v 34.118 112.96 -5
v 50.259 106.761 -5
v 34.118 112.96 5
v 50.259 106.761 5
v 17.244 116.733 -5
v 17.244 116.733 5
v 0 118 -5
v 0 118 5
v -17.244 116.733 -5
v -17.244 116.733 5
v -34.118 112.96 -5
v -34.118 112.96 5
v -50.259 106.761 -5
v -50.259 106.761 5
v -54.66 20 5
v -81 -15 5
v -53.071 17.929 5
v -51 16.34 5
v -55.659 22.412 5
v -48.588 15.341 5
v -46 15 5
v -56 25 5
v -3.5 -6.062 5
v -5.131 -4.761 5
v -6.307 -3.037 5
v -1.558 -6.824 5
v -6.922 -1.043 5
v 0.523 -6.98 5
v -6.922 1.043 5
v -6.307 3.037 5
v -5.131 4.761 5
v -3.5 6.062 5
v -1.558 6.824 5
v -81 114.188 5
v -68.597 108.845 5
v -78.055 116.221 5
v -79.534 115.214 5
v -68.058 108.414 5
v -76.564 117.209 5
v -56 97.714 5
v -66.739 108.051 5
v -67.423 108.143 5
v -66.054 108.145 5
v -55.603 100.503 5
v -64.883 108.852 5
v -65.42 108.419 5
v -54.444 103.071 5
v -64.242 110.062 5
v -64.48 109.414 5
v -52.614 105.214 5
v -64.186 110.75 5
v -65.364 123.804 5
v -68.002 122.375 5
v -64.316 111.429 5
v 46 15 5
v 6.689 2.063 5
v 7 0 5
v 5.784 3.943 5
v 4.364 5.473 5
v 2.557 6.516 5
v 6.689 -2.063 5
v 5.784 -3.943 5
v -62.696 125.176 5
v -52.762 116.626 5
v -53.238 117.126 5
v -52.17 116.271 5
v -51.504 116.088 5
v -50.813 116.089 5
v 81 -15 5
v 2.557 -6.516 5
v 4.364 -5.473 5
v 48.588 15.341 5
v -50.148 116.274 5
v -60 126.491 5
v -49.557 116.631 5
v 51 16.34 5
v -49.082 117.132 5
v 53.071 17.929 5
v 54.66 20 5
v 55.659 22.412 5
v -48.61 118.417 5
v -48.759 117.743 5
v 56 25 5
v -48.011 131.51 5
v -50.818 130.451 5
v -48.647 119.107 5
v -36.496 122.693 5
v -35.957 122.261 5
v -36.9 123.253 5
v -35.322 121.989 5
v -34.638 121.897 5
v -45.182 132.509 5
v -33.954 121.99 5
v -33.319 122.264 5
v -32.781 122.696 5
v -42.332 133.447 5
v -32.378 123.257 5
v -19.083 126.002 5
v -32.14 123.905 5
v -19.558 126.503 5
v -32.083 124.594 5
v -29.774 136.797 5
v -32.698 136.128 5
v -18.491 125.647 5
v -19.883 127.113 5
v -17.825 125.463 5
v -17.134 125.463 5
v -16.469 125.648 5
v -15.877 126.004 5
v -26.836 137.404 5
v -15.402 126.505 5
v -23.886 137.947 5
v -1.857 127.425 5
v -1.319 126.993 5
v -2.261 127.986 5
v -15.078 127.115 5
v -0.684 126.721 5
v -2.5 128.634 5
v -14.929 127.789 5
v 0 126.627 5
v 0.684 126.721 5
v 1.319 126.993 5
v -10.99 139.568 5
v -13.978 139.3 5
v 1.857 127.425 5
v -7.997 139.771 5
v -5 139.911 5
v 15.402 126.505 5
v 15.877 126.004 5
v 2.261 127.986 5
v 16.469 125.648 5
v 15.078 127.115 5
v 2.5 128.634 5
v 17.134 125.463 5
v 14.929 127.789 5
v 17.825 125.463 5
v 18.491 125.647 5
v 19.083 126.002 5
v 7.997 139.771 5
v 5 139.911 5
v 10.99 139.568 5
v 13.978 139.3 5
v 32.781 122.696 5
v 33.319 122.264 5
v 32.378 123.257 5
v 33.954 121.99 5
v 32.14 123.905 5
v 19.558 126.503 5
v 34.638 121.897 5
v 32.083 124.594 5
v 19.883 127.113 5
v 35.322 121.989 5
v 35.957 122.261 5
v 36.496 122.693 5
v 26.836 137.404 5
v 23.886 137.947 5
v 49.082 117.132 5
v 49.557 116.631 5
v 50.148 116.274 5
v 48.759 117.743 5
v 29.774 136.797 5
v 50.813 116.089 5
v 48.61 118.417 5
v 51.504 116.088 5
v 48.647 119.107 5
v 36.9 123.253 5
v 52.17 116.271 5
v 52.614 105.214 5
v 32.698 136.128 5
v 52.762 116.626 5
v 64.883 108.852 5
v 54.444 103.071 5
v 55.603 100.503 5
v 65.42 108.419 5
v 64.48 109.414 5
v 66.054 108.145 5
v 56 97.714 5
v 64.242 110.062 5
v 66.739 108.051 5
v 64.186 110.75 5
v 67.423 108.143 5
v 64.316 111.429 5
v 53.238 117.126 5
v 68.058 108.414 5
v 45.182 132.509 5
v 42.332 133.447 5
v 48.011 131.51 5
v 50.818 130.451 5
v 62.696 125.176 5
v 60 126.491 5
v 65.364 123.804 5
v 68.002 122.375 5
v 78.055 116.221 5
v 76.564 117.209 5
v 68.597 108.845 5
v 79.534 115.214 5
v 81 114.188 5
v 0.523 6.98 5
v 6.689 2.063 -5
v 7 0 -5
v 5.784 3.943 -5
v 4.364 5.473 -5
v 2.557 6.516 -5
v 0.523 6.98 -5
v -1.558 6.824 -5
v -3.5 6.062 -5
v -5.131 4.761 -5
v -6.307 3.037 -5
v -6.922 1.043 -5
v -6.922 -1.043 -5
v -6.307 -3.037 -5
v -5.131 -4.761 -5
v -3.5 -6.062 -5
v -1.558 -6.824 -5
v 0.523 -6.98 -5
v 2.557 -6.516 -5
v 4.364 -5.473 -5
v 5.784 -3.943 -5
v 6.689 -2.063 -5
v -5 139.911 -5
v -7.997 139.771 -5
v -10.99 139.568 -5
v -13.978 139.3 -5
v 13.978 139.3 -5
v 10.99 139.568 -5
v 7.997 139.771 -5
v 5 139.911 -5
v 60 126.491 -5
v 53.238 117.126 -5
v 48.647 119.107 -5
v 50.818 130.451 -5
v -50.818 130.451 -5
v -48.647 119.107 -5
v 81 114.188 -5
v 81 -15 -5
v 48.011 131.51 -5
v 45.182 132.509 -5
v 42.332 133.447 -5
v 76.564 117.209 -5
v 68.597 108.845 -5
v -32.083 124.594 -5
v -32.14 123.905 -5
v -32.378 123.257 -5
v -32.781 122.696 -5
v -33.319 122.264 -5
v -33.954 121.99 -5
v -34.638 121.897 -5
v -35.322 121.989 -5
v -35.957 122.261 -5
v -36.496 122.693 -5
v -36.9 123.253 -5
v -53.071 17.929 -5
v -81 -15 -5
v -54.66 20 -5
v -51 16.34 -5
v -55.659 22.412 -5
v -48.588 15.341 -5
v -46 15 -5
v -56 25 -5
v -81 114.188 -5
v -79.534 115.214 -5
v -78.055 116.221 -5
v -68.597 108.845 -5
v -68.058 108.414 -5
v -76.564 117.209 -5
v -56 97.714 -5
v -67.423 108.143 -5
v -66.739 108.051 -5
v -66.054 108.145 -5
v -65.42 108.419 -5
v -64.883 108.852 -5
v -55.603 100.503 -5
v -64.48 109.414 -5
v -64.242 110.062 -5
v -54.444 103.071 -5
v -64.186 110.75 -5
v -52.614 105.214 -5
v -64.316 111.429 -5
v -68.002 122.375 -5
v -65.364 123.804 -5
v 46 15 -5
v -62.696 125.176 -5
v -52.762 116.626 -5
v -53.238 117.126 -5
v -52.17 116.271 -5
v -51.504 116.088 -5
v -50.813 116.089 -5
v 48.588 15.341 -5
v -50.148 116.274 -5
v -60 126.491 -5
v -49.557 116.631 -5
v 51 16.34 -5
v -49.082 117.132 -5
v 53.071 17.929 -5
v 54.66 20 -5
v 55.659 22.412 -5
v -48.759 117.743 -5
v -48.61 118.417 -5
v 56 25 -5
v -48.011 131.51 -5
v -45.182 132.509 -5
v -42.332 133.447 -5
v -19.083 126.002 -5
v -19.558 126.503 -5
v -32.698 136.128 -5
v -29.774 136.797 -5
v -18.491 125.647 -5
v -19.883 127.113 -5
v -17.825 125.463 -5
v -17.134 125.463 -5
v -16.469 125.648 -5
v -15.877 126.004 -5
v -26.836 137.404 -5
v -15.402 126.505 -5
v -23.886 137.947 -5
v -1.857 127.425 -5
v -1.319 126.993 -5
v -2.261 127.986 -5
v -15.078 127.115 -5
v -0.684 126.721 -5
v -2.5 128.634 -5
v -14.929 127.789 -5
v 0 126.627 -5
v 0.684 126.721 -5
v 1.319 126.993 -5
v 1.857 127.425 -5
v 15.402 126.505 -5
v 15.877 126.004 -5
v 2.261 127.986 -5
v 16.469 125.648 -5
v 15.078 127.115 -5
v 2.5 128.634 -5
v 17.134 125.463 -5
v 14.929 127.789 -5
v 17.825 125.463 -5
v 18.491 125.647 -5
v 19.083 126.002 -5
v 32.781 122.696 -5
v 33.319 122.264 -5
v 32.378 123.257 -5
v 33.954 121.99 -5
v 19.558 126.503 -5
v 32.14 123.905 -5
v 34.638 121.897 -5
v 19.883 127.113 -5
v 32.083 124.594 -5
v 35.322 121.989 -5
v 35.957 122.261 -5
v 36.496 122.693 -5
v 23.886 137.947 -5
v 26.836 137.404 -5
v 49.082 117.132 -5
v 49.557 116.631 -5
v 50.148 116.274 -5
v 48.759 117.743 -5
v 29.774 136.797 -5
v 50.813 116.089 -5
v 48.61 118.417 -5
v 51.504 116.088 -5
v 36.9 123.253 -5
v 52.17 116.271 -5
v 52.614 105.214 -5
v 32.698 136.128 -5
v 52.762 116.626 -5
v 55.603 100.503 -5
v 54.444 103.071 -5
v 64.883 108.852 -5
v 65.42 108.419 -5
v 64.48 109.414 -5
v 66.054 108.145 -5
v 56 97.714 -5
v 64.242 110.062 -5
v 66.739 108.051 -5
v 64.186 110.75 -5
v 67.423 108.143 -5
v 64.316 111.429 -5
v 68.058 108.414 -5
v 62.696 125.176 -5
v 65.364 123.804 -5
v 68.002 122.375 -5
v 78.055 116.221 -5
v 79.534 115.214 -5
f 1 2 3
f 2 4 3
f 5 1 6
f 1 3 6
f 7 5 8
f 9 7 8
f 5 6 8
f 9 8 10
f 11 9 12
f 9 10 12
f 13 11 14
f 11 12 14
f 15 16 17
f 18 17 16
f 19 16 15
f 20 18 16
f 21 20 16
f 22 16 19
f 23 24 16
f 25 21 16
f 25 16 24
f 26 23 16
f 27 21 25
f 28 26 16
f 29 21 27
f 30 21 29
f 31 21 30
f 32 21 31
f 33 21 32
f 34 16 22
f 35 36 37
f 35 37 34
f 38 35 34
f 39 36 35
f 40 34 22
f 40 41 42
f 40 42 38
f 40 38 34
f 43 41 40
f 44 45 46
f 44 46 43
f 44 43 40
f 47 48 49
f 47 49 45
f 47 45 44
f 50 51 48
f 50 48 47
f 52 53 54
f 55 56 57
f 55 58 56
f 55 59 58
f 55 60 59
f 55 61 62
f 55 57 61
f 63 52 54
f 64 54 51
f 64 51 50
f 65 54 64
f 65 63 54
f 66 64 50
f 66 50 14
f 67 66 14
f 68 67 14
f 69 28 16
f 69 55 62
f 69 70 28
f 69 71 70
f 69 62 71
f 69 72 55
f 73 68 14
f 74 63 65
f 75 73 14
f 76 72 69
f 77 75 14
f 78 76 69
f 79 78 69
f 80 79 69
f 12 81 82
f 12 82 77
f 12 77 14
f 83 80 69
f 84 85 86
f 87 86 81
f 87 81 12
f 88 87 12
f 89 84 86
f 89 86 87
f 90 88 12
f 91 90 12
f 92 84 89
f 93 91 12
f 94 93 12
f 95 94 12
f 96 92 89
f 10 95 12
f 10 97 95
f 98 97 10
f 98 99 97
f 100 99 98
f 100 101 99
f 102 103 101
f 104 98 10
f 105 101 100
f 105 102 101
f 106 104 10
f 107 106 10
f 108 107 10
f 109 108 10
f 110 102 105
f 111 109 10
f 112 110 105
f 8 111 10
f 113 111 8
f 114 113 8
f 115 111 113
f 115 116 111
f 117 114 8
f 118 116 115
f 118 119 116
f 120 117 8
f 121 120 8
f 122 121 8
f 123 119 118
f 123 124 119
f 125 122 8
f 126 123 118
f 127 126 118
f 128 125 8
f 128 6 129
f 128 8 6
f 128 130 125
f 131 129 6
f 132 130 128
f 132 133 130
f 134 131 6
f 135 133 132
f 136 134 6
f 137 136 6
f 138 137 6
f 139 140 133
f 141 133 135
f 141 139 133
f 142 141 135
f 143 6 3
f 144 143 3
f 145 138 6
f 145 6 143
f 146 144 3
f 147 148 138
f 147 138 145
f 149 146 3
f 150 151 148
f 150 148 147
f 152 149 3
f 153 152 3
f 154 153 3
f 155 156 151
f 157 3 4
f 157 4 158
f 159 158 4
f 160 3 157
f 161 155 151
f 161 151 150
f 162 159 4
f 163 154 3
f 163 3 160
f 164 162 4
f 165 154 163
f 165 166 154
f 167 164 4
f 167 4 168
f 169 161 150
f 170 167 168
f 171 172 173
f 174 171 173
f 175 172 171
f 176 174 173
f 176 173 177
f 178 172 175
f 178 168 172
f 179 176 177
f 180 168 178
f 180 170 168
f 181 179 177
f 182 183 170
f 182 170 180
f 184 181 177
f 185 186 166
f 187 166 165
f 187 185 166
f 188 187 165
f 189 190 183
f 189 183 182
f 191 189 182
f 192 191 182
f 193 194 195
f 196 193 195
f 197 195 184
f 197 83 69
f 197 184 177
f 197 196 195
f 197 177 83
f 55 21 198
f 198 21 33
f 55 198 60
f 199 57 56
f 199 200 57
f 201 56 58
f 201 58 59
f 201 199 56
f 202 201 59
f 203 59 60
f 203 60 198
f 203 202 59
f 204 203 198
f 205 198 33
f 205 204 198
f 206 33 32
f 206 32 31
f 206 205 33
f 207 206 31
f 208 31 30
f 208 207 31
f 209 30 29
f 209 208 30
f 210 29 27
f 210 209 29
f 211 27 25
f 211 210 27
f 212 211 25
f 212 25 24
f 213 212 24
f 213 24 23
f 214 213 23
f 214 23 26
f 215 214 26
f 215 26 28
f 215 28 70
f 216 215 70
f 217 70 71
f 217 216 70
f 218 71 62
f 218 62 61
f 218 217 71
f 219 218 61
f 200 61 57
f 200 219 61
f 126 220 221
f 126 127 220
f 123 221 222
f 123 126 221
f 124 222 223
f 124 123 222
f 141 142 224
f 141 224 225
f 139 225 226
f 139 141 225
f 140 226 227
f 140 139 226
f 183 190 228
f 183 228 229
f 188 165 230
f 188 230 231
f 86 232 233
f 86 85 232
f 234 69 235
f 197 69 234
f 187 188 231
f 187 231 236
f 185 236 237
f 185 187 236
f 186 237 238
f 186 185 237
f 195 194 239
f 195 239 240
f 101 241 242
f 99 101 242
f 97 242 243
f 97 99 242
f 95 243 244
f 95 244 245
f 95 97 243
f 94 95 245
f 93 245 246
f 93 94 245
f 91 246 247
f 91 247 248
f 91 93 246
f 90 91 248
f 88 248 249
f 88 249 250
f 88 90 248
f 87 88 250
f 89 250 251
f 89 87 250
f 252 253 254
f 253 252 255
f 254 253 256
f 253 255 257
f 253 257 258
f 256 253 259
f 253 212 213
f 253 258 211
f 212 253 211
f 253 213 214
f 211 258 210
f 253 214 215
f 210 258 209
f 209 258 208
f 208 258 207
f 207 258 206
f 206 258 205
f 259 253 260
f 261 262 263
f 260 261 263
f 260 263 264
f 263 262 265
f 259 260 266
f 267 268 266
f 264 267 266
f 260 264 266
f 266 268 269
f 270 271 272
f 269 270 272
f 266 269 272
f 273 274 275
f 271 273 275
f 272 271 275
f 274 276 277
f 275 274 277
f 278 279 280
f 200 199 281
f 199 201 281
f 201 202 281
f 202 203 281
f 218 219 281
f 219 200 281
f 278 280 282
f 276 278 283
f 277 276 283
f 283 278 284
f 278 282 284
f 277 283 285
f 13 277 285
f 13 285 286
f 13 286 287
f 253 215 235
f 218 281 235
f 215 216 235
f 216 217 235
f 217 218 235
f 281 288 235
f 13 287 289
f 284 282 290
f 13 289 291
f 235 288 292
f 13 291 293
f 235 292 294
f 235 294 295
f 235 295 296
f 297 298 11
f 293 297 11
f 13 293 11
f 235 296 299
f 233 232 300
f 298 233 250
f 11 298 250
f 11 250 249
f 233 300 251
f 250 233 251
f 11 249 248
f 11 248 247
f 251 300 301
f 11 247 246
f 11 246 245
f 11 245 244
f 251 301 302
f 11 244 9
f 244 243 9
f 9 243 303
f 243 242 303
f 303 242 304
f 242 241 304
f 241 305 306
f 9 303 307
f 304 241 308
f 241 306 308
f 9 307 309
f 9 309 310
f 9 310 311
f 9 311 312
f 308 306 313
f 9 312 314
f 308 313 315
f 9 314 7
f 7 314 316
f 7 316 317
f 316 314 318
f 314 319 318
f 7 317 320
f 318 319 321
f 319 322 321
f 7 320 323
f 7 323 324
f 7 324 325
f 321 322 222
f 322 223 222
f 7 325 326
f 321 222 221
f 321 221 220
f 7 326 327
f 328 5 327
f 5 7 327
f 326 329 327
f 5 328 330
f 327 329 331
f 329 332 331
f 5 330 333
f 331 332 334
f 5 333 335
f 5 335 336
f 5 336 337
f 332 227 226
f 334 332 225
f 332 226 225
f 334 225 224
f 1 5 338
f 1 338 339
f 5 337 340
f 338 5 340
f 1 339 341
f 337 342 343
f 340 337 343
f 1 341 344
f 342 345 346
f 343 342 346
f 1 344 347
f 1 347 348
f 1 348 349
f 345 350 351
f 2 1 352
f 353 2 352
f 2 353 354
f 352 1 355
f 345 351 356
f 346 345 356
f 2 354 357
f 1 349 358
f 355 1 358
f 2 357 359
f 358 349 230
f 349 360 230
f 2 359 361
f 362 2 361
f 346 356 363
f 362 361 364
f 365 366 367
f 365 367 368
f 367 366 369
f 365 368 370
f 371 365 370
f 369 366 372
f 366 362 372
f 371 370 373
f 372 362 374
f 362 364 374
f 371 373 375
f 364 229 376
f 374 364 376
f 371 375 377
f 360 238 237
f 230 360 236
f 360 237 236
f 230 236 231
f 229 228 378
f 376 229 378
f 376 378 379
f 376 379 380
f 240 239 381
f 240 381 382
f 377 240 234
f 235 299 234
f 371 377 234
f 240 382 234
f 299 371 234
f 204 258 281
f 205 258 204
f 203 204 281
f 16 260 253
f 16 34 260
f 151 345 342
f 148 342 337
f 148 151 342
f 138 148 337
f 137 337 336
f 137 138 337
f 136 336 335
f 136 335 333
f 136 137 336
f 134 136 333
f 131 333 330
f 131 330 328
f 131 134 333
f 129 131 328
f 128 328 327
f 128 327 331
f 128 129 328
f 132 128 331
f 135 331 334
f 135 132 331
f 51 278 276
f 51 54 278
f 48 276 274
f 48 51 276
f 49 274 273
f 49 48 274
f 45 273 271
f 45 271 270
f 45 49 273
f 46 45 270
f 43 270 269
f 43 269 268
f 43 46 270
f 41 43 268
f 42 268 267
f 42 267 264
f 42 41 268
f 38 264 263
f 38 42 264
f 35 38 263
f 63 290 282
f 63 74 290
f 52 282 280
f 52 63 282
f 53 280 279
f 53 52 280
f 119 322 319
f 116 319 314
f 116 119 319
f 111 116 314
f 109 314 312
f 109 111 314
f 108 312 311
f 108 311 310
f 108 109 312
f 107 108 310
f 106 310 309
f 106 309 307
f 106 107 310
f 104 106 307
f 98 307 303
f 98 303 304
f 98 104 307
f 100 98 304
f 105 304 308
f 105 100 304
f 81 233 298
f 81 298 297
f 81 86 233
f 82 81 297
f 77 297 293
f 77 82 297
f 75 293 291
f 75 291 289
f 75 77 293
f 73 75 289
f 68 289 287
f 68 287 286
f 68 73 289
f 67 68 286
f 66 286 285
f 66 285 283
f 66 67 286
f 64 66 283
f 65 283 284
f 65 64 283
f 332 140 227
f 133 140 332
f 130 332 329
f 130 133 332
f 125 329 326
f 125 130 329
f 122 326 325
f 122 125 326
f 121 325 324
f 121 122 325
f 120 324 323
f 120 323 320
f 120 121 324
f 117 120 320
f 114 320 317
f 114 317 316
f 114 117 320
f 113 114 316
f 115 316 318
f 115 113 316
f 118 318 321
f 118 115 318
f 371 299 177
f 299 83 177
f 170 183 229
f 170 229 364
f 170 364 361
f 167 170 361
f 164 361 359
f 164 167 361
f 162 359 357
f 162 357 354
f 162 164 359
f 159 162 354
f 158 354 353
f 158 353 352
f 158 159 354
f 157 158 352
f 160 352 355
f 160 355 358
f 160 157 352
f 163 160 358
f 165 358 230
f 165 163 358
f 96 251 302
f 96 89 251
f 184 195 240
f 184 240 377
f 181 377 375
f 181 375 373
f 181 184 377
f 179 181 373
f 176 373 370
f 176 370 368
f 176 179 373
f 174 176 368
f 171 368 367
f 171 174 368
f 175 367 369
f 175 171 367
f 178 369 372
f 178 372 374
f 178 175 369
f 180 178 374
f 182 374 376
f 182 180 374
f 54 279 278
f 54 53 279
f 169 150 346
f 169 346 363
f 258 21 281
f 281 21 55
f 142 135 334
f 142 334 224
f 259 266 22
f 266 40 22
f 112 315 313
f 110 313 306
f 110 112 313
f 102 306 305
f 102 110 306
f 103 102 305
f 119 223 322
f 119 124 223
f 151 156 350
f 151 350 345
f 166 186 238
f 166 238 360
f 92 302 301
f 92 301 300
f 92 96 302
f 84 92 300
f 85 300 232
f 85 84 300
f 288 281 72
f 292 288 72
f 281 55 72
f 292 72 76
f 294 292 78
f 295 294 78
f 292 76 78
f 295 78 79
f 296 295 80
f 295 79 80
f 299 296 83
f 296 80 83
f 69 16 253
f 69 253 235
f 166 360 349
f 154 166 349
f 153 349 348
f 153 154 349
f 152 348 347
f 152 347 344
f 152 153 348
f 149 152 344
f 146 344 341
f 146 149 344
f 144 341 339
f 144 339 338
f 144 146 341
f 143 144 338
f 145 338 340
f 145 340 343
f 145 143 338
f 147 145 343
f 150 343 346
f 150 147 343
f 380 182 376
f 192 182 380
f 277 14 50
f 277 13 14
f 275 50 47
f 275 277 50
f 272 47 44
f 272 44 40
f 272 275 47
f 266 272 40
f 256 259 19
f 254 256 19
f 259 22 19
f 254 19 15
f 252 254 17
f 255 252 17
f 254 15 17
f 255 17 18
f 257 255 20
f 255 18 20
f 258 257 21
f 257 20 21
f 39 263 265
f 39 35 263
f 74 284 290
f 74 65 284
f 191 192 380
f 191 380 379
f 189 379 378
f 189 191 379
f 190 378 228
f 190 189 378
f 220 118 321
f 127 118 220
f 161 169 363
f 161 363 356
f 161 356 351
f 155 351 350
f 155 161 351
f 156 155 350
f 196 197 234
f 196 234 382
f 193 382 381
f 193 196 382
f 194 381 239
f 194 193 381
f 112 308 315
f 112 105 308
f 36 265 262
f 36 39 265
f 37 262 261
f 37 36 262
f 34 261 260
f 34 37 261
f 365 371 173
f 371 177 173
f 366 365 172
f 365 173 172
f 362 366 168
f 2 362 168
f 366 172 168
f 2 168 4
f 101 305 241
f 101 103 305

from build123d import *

# Parameters (mm, degrees)
ESQUISSE1_R        = 7
BOSS_EXTRU_2_DEPTH = 5


with BuildPart() as part:
    # Esquisse1 → Boss.-Extru.2 (new body, symmetric)
    with BuildSketch(Plane.XY):
        with BuildLine():
            Line((-81, 114.188440746), (-81, -15))
            Line((-81, -15), (81, -15))
            Line((81, -15), (81, 114.188440746))
            ThreePointArc((81, 114.188440746), (78.796472268, 115.719989449), (76.563994166, 117.209021825))
            Line((76.563994166, 117.209021825), (68.597490223, 108.845387152))
            ThreePointArc((68.597490223, 108.845387152), (65.420366542, 108.419035897), (64.316466092, 111.428569759))
            Line((64.316466092, 111.428569759), (68.001945903, 122.375387041))
            ThreePointArc((68.001945903, 122.375387041), (64.034003077, 124.497576081), (59.999908366, 126.491149872))
            Line((59.999908366, 126.491149872), (53.238382738, 117.126464015))
            ThreePointArc((53.238382738, 117.126464015), (50.148170341, 116.274127452), (48.64719318, 119.10661008))
            Line((48.64719318, 119.10661008), (50.81752925, 130.451442004))
            ThreePointArc((50.81752925, 130.451442004), (46.598920029, 132.017198319), (42.332170661, 133.446571058))
            Line((42.332170661, 133.446571058), (36.899996383, 123.253090169))
            ThreePointArc((36.899996383, 123.253090169), (33.953537336, 121.990446371), (32.083092779, 124.593776437))
            Line((32.083092779, 124.593776437), (32.698363453, 136.127943595))
            ThreePointArc((32.698363453, 136.127943595), (28.306685892, 137.10846631), (23.88576542, 137.947345789))
            Line((23.88576542, 137.947345789), (19.882863135, 127.112571065))
            ThreePointArc((19.882863135, 127.112571065), (17.134355274, 125.462845387), (14.928848702, 127.789136649))
            Line((14.928848702, 127.789136649), (13.977736553, 139.300476958))
            ThreePointArc((13.977736553, 139.300476958), (9.493772162, 139.677730115), (5, 139.910685796))
            Line((5, 139.910685796), (2.5, 128.633914537))
            ThreePointArc((2.5, 128.633914537), (0, 126.627452408), (-2.5, 128.633914537))
            Line((-2.5, 128.633914537), (-5, 139.910685796))
            ThreePointArc((-5, 139.910685796), (-9.493772162, 139.677730115), (-13.977736553, 139.300476958))
            Line((-13.977736553, 139.300476958), (-14.928848702, 127.789136649))
            ThreePointArc((-14.928848702, 127.789136649), (-17.134355274, 125.462845387), (-19.882863135, 127.112571065))
            Line((-19.882863135, 127.112571065), (-23.88576542, 137.947345789))
            ThreePointArc((-23.88576542, 137.947345789), (-28.306685892, 137.10846631), (-32.698363453, 136.127943595))
            Line((-32.698363453, 136.127943595), (-32.083092779, 124.593776437))
            ThreePointArc((-32.083092779, 124.593776437), (-33.953537336, 121.990446371), (-36.899996383, 123.253090169))
            Line((-36.899996383, 123.253090169), (-42.332170661, 133.446571058))
            ThreePointArc((-42.332170661, 133.446571058), (-46.598920029, 132.017198319), (-50.81752925, 130.451442004))
            Line((-50.81752925, 130.451442004), (-48.64719318, 119.10661008))
            ThreePointArc((-48.64719318, 119.10661008), (-50.148170341, 116.274127452), (-53.238382738, 117.126464015))
            Line((-53.238382738, 117.126464015), (-59.999908366, 126.491149872))
            ThreePointArc((-59.999908366, 126.491149872), (-64.034003077, 124.497576081), (-68.001945903, 122.375387041))
            Line((-68.001945903, 122.375387041), (-64.316466092, 111.428569759))
            ThreePointArc((-64.316466092, 111.428569759), (-65.420366542, 108.419035897), (-68.597490223, 108.845387152))
            Line((-68.597490223, 108.845387152), (-76.563994166, 117.209021825))
            ThreePointArc((-76.563994166, 117.209021825), (-78.796472268, 115.719989449), (-81, 114.188440746))
        make_face()
        Circle(ESQUISSE1_R, mode=Mode.SUBTRACT)
        with BuildLine():
            Line((-56, 97.713868002), (-56, 25))
            ThreePointArc((-56, 25), (-53.071067812, 17.928932188), (-46, 15))
            Line((-46, 15), (46, 15))
            ThreePointArc((46, 15), (53.071067812, 17.928932188), (56, 25))
            Line((56, 25), (56, 97.713868002))
            ThreePointArc((56, 97.713868002), (54.443713419, 103.071451759), (50.259259259, 106.761448373))
            ThreePointArc((50.259259259, 106.761448373), (0, 118), (-50.259259259, 106.761448373))
            ThreePointArc((-50.259259259, 106.761448373), (-54.443713419, 103.071451759), (-56, 97.713868002))
        make_face(mode=Mode.SUBTRACT)
    extrude(amount=BOSS_EXTRU_2_DEPTH, both=True)


solid = part.part
